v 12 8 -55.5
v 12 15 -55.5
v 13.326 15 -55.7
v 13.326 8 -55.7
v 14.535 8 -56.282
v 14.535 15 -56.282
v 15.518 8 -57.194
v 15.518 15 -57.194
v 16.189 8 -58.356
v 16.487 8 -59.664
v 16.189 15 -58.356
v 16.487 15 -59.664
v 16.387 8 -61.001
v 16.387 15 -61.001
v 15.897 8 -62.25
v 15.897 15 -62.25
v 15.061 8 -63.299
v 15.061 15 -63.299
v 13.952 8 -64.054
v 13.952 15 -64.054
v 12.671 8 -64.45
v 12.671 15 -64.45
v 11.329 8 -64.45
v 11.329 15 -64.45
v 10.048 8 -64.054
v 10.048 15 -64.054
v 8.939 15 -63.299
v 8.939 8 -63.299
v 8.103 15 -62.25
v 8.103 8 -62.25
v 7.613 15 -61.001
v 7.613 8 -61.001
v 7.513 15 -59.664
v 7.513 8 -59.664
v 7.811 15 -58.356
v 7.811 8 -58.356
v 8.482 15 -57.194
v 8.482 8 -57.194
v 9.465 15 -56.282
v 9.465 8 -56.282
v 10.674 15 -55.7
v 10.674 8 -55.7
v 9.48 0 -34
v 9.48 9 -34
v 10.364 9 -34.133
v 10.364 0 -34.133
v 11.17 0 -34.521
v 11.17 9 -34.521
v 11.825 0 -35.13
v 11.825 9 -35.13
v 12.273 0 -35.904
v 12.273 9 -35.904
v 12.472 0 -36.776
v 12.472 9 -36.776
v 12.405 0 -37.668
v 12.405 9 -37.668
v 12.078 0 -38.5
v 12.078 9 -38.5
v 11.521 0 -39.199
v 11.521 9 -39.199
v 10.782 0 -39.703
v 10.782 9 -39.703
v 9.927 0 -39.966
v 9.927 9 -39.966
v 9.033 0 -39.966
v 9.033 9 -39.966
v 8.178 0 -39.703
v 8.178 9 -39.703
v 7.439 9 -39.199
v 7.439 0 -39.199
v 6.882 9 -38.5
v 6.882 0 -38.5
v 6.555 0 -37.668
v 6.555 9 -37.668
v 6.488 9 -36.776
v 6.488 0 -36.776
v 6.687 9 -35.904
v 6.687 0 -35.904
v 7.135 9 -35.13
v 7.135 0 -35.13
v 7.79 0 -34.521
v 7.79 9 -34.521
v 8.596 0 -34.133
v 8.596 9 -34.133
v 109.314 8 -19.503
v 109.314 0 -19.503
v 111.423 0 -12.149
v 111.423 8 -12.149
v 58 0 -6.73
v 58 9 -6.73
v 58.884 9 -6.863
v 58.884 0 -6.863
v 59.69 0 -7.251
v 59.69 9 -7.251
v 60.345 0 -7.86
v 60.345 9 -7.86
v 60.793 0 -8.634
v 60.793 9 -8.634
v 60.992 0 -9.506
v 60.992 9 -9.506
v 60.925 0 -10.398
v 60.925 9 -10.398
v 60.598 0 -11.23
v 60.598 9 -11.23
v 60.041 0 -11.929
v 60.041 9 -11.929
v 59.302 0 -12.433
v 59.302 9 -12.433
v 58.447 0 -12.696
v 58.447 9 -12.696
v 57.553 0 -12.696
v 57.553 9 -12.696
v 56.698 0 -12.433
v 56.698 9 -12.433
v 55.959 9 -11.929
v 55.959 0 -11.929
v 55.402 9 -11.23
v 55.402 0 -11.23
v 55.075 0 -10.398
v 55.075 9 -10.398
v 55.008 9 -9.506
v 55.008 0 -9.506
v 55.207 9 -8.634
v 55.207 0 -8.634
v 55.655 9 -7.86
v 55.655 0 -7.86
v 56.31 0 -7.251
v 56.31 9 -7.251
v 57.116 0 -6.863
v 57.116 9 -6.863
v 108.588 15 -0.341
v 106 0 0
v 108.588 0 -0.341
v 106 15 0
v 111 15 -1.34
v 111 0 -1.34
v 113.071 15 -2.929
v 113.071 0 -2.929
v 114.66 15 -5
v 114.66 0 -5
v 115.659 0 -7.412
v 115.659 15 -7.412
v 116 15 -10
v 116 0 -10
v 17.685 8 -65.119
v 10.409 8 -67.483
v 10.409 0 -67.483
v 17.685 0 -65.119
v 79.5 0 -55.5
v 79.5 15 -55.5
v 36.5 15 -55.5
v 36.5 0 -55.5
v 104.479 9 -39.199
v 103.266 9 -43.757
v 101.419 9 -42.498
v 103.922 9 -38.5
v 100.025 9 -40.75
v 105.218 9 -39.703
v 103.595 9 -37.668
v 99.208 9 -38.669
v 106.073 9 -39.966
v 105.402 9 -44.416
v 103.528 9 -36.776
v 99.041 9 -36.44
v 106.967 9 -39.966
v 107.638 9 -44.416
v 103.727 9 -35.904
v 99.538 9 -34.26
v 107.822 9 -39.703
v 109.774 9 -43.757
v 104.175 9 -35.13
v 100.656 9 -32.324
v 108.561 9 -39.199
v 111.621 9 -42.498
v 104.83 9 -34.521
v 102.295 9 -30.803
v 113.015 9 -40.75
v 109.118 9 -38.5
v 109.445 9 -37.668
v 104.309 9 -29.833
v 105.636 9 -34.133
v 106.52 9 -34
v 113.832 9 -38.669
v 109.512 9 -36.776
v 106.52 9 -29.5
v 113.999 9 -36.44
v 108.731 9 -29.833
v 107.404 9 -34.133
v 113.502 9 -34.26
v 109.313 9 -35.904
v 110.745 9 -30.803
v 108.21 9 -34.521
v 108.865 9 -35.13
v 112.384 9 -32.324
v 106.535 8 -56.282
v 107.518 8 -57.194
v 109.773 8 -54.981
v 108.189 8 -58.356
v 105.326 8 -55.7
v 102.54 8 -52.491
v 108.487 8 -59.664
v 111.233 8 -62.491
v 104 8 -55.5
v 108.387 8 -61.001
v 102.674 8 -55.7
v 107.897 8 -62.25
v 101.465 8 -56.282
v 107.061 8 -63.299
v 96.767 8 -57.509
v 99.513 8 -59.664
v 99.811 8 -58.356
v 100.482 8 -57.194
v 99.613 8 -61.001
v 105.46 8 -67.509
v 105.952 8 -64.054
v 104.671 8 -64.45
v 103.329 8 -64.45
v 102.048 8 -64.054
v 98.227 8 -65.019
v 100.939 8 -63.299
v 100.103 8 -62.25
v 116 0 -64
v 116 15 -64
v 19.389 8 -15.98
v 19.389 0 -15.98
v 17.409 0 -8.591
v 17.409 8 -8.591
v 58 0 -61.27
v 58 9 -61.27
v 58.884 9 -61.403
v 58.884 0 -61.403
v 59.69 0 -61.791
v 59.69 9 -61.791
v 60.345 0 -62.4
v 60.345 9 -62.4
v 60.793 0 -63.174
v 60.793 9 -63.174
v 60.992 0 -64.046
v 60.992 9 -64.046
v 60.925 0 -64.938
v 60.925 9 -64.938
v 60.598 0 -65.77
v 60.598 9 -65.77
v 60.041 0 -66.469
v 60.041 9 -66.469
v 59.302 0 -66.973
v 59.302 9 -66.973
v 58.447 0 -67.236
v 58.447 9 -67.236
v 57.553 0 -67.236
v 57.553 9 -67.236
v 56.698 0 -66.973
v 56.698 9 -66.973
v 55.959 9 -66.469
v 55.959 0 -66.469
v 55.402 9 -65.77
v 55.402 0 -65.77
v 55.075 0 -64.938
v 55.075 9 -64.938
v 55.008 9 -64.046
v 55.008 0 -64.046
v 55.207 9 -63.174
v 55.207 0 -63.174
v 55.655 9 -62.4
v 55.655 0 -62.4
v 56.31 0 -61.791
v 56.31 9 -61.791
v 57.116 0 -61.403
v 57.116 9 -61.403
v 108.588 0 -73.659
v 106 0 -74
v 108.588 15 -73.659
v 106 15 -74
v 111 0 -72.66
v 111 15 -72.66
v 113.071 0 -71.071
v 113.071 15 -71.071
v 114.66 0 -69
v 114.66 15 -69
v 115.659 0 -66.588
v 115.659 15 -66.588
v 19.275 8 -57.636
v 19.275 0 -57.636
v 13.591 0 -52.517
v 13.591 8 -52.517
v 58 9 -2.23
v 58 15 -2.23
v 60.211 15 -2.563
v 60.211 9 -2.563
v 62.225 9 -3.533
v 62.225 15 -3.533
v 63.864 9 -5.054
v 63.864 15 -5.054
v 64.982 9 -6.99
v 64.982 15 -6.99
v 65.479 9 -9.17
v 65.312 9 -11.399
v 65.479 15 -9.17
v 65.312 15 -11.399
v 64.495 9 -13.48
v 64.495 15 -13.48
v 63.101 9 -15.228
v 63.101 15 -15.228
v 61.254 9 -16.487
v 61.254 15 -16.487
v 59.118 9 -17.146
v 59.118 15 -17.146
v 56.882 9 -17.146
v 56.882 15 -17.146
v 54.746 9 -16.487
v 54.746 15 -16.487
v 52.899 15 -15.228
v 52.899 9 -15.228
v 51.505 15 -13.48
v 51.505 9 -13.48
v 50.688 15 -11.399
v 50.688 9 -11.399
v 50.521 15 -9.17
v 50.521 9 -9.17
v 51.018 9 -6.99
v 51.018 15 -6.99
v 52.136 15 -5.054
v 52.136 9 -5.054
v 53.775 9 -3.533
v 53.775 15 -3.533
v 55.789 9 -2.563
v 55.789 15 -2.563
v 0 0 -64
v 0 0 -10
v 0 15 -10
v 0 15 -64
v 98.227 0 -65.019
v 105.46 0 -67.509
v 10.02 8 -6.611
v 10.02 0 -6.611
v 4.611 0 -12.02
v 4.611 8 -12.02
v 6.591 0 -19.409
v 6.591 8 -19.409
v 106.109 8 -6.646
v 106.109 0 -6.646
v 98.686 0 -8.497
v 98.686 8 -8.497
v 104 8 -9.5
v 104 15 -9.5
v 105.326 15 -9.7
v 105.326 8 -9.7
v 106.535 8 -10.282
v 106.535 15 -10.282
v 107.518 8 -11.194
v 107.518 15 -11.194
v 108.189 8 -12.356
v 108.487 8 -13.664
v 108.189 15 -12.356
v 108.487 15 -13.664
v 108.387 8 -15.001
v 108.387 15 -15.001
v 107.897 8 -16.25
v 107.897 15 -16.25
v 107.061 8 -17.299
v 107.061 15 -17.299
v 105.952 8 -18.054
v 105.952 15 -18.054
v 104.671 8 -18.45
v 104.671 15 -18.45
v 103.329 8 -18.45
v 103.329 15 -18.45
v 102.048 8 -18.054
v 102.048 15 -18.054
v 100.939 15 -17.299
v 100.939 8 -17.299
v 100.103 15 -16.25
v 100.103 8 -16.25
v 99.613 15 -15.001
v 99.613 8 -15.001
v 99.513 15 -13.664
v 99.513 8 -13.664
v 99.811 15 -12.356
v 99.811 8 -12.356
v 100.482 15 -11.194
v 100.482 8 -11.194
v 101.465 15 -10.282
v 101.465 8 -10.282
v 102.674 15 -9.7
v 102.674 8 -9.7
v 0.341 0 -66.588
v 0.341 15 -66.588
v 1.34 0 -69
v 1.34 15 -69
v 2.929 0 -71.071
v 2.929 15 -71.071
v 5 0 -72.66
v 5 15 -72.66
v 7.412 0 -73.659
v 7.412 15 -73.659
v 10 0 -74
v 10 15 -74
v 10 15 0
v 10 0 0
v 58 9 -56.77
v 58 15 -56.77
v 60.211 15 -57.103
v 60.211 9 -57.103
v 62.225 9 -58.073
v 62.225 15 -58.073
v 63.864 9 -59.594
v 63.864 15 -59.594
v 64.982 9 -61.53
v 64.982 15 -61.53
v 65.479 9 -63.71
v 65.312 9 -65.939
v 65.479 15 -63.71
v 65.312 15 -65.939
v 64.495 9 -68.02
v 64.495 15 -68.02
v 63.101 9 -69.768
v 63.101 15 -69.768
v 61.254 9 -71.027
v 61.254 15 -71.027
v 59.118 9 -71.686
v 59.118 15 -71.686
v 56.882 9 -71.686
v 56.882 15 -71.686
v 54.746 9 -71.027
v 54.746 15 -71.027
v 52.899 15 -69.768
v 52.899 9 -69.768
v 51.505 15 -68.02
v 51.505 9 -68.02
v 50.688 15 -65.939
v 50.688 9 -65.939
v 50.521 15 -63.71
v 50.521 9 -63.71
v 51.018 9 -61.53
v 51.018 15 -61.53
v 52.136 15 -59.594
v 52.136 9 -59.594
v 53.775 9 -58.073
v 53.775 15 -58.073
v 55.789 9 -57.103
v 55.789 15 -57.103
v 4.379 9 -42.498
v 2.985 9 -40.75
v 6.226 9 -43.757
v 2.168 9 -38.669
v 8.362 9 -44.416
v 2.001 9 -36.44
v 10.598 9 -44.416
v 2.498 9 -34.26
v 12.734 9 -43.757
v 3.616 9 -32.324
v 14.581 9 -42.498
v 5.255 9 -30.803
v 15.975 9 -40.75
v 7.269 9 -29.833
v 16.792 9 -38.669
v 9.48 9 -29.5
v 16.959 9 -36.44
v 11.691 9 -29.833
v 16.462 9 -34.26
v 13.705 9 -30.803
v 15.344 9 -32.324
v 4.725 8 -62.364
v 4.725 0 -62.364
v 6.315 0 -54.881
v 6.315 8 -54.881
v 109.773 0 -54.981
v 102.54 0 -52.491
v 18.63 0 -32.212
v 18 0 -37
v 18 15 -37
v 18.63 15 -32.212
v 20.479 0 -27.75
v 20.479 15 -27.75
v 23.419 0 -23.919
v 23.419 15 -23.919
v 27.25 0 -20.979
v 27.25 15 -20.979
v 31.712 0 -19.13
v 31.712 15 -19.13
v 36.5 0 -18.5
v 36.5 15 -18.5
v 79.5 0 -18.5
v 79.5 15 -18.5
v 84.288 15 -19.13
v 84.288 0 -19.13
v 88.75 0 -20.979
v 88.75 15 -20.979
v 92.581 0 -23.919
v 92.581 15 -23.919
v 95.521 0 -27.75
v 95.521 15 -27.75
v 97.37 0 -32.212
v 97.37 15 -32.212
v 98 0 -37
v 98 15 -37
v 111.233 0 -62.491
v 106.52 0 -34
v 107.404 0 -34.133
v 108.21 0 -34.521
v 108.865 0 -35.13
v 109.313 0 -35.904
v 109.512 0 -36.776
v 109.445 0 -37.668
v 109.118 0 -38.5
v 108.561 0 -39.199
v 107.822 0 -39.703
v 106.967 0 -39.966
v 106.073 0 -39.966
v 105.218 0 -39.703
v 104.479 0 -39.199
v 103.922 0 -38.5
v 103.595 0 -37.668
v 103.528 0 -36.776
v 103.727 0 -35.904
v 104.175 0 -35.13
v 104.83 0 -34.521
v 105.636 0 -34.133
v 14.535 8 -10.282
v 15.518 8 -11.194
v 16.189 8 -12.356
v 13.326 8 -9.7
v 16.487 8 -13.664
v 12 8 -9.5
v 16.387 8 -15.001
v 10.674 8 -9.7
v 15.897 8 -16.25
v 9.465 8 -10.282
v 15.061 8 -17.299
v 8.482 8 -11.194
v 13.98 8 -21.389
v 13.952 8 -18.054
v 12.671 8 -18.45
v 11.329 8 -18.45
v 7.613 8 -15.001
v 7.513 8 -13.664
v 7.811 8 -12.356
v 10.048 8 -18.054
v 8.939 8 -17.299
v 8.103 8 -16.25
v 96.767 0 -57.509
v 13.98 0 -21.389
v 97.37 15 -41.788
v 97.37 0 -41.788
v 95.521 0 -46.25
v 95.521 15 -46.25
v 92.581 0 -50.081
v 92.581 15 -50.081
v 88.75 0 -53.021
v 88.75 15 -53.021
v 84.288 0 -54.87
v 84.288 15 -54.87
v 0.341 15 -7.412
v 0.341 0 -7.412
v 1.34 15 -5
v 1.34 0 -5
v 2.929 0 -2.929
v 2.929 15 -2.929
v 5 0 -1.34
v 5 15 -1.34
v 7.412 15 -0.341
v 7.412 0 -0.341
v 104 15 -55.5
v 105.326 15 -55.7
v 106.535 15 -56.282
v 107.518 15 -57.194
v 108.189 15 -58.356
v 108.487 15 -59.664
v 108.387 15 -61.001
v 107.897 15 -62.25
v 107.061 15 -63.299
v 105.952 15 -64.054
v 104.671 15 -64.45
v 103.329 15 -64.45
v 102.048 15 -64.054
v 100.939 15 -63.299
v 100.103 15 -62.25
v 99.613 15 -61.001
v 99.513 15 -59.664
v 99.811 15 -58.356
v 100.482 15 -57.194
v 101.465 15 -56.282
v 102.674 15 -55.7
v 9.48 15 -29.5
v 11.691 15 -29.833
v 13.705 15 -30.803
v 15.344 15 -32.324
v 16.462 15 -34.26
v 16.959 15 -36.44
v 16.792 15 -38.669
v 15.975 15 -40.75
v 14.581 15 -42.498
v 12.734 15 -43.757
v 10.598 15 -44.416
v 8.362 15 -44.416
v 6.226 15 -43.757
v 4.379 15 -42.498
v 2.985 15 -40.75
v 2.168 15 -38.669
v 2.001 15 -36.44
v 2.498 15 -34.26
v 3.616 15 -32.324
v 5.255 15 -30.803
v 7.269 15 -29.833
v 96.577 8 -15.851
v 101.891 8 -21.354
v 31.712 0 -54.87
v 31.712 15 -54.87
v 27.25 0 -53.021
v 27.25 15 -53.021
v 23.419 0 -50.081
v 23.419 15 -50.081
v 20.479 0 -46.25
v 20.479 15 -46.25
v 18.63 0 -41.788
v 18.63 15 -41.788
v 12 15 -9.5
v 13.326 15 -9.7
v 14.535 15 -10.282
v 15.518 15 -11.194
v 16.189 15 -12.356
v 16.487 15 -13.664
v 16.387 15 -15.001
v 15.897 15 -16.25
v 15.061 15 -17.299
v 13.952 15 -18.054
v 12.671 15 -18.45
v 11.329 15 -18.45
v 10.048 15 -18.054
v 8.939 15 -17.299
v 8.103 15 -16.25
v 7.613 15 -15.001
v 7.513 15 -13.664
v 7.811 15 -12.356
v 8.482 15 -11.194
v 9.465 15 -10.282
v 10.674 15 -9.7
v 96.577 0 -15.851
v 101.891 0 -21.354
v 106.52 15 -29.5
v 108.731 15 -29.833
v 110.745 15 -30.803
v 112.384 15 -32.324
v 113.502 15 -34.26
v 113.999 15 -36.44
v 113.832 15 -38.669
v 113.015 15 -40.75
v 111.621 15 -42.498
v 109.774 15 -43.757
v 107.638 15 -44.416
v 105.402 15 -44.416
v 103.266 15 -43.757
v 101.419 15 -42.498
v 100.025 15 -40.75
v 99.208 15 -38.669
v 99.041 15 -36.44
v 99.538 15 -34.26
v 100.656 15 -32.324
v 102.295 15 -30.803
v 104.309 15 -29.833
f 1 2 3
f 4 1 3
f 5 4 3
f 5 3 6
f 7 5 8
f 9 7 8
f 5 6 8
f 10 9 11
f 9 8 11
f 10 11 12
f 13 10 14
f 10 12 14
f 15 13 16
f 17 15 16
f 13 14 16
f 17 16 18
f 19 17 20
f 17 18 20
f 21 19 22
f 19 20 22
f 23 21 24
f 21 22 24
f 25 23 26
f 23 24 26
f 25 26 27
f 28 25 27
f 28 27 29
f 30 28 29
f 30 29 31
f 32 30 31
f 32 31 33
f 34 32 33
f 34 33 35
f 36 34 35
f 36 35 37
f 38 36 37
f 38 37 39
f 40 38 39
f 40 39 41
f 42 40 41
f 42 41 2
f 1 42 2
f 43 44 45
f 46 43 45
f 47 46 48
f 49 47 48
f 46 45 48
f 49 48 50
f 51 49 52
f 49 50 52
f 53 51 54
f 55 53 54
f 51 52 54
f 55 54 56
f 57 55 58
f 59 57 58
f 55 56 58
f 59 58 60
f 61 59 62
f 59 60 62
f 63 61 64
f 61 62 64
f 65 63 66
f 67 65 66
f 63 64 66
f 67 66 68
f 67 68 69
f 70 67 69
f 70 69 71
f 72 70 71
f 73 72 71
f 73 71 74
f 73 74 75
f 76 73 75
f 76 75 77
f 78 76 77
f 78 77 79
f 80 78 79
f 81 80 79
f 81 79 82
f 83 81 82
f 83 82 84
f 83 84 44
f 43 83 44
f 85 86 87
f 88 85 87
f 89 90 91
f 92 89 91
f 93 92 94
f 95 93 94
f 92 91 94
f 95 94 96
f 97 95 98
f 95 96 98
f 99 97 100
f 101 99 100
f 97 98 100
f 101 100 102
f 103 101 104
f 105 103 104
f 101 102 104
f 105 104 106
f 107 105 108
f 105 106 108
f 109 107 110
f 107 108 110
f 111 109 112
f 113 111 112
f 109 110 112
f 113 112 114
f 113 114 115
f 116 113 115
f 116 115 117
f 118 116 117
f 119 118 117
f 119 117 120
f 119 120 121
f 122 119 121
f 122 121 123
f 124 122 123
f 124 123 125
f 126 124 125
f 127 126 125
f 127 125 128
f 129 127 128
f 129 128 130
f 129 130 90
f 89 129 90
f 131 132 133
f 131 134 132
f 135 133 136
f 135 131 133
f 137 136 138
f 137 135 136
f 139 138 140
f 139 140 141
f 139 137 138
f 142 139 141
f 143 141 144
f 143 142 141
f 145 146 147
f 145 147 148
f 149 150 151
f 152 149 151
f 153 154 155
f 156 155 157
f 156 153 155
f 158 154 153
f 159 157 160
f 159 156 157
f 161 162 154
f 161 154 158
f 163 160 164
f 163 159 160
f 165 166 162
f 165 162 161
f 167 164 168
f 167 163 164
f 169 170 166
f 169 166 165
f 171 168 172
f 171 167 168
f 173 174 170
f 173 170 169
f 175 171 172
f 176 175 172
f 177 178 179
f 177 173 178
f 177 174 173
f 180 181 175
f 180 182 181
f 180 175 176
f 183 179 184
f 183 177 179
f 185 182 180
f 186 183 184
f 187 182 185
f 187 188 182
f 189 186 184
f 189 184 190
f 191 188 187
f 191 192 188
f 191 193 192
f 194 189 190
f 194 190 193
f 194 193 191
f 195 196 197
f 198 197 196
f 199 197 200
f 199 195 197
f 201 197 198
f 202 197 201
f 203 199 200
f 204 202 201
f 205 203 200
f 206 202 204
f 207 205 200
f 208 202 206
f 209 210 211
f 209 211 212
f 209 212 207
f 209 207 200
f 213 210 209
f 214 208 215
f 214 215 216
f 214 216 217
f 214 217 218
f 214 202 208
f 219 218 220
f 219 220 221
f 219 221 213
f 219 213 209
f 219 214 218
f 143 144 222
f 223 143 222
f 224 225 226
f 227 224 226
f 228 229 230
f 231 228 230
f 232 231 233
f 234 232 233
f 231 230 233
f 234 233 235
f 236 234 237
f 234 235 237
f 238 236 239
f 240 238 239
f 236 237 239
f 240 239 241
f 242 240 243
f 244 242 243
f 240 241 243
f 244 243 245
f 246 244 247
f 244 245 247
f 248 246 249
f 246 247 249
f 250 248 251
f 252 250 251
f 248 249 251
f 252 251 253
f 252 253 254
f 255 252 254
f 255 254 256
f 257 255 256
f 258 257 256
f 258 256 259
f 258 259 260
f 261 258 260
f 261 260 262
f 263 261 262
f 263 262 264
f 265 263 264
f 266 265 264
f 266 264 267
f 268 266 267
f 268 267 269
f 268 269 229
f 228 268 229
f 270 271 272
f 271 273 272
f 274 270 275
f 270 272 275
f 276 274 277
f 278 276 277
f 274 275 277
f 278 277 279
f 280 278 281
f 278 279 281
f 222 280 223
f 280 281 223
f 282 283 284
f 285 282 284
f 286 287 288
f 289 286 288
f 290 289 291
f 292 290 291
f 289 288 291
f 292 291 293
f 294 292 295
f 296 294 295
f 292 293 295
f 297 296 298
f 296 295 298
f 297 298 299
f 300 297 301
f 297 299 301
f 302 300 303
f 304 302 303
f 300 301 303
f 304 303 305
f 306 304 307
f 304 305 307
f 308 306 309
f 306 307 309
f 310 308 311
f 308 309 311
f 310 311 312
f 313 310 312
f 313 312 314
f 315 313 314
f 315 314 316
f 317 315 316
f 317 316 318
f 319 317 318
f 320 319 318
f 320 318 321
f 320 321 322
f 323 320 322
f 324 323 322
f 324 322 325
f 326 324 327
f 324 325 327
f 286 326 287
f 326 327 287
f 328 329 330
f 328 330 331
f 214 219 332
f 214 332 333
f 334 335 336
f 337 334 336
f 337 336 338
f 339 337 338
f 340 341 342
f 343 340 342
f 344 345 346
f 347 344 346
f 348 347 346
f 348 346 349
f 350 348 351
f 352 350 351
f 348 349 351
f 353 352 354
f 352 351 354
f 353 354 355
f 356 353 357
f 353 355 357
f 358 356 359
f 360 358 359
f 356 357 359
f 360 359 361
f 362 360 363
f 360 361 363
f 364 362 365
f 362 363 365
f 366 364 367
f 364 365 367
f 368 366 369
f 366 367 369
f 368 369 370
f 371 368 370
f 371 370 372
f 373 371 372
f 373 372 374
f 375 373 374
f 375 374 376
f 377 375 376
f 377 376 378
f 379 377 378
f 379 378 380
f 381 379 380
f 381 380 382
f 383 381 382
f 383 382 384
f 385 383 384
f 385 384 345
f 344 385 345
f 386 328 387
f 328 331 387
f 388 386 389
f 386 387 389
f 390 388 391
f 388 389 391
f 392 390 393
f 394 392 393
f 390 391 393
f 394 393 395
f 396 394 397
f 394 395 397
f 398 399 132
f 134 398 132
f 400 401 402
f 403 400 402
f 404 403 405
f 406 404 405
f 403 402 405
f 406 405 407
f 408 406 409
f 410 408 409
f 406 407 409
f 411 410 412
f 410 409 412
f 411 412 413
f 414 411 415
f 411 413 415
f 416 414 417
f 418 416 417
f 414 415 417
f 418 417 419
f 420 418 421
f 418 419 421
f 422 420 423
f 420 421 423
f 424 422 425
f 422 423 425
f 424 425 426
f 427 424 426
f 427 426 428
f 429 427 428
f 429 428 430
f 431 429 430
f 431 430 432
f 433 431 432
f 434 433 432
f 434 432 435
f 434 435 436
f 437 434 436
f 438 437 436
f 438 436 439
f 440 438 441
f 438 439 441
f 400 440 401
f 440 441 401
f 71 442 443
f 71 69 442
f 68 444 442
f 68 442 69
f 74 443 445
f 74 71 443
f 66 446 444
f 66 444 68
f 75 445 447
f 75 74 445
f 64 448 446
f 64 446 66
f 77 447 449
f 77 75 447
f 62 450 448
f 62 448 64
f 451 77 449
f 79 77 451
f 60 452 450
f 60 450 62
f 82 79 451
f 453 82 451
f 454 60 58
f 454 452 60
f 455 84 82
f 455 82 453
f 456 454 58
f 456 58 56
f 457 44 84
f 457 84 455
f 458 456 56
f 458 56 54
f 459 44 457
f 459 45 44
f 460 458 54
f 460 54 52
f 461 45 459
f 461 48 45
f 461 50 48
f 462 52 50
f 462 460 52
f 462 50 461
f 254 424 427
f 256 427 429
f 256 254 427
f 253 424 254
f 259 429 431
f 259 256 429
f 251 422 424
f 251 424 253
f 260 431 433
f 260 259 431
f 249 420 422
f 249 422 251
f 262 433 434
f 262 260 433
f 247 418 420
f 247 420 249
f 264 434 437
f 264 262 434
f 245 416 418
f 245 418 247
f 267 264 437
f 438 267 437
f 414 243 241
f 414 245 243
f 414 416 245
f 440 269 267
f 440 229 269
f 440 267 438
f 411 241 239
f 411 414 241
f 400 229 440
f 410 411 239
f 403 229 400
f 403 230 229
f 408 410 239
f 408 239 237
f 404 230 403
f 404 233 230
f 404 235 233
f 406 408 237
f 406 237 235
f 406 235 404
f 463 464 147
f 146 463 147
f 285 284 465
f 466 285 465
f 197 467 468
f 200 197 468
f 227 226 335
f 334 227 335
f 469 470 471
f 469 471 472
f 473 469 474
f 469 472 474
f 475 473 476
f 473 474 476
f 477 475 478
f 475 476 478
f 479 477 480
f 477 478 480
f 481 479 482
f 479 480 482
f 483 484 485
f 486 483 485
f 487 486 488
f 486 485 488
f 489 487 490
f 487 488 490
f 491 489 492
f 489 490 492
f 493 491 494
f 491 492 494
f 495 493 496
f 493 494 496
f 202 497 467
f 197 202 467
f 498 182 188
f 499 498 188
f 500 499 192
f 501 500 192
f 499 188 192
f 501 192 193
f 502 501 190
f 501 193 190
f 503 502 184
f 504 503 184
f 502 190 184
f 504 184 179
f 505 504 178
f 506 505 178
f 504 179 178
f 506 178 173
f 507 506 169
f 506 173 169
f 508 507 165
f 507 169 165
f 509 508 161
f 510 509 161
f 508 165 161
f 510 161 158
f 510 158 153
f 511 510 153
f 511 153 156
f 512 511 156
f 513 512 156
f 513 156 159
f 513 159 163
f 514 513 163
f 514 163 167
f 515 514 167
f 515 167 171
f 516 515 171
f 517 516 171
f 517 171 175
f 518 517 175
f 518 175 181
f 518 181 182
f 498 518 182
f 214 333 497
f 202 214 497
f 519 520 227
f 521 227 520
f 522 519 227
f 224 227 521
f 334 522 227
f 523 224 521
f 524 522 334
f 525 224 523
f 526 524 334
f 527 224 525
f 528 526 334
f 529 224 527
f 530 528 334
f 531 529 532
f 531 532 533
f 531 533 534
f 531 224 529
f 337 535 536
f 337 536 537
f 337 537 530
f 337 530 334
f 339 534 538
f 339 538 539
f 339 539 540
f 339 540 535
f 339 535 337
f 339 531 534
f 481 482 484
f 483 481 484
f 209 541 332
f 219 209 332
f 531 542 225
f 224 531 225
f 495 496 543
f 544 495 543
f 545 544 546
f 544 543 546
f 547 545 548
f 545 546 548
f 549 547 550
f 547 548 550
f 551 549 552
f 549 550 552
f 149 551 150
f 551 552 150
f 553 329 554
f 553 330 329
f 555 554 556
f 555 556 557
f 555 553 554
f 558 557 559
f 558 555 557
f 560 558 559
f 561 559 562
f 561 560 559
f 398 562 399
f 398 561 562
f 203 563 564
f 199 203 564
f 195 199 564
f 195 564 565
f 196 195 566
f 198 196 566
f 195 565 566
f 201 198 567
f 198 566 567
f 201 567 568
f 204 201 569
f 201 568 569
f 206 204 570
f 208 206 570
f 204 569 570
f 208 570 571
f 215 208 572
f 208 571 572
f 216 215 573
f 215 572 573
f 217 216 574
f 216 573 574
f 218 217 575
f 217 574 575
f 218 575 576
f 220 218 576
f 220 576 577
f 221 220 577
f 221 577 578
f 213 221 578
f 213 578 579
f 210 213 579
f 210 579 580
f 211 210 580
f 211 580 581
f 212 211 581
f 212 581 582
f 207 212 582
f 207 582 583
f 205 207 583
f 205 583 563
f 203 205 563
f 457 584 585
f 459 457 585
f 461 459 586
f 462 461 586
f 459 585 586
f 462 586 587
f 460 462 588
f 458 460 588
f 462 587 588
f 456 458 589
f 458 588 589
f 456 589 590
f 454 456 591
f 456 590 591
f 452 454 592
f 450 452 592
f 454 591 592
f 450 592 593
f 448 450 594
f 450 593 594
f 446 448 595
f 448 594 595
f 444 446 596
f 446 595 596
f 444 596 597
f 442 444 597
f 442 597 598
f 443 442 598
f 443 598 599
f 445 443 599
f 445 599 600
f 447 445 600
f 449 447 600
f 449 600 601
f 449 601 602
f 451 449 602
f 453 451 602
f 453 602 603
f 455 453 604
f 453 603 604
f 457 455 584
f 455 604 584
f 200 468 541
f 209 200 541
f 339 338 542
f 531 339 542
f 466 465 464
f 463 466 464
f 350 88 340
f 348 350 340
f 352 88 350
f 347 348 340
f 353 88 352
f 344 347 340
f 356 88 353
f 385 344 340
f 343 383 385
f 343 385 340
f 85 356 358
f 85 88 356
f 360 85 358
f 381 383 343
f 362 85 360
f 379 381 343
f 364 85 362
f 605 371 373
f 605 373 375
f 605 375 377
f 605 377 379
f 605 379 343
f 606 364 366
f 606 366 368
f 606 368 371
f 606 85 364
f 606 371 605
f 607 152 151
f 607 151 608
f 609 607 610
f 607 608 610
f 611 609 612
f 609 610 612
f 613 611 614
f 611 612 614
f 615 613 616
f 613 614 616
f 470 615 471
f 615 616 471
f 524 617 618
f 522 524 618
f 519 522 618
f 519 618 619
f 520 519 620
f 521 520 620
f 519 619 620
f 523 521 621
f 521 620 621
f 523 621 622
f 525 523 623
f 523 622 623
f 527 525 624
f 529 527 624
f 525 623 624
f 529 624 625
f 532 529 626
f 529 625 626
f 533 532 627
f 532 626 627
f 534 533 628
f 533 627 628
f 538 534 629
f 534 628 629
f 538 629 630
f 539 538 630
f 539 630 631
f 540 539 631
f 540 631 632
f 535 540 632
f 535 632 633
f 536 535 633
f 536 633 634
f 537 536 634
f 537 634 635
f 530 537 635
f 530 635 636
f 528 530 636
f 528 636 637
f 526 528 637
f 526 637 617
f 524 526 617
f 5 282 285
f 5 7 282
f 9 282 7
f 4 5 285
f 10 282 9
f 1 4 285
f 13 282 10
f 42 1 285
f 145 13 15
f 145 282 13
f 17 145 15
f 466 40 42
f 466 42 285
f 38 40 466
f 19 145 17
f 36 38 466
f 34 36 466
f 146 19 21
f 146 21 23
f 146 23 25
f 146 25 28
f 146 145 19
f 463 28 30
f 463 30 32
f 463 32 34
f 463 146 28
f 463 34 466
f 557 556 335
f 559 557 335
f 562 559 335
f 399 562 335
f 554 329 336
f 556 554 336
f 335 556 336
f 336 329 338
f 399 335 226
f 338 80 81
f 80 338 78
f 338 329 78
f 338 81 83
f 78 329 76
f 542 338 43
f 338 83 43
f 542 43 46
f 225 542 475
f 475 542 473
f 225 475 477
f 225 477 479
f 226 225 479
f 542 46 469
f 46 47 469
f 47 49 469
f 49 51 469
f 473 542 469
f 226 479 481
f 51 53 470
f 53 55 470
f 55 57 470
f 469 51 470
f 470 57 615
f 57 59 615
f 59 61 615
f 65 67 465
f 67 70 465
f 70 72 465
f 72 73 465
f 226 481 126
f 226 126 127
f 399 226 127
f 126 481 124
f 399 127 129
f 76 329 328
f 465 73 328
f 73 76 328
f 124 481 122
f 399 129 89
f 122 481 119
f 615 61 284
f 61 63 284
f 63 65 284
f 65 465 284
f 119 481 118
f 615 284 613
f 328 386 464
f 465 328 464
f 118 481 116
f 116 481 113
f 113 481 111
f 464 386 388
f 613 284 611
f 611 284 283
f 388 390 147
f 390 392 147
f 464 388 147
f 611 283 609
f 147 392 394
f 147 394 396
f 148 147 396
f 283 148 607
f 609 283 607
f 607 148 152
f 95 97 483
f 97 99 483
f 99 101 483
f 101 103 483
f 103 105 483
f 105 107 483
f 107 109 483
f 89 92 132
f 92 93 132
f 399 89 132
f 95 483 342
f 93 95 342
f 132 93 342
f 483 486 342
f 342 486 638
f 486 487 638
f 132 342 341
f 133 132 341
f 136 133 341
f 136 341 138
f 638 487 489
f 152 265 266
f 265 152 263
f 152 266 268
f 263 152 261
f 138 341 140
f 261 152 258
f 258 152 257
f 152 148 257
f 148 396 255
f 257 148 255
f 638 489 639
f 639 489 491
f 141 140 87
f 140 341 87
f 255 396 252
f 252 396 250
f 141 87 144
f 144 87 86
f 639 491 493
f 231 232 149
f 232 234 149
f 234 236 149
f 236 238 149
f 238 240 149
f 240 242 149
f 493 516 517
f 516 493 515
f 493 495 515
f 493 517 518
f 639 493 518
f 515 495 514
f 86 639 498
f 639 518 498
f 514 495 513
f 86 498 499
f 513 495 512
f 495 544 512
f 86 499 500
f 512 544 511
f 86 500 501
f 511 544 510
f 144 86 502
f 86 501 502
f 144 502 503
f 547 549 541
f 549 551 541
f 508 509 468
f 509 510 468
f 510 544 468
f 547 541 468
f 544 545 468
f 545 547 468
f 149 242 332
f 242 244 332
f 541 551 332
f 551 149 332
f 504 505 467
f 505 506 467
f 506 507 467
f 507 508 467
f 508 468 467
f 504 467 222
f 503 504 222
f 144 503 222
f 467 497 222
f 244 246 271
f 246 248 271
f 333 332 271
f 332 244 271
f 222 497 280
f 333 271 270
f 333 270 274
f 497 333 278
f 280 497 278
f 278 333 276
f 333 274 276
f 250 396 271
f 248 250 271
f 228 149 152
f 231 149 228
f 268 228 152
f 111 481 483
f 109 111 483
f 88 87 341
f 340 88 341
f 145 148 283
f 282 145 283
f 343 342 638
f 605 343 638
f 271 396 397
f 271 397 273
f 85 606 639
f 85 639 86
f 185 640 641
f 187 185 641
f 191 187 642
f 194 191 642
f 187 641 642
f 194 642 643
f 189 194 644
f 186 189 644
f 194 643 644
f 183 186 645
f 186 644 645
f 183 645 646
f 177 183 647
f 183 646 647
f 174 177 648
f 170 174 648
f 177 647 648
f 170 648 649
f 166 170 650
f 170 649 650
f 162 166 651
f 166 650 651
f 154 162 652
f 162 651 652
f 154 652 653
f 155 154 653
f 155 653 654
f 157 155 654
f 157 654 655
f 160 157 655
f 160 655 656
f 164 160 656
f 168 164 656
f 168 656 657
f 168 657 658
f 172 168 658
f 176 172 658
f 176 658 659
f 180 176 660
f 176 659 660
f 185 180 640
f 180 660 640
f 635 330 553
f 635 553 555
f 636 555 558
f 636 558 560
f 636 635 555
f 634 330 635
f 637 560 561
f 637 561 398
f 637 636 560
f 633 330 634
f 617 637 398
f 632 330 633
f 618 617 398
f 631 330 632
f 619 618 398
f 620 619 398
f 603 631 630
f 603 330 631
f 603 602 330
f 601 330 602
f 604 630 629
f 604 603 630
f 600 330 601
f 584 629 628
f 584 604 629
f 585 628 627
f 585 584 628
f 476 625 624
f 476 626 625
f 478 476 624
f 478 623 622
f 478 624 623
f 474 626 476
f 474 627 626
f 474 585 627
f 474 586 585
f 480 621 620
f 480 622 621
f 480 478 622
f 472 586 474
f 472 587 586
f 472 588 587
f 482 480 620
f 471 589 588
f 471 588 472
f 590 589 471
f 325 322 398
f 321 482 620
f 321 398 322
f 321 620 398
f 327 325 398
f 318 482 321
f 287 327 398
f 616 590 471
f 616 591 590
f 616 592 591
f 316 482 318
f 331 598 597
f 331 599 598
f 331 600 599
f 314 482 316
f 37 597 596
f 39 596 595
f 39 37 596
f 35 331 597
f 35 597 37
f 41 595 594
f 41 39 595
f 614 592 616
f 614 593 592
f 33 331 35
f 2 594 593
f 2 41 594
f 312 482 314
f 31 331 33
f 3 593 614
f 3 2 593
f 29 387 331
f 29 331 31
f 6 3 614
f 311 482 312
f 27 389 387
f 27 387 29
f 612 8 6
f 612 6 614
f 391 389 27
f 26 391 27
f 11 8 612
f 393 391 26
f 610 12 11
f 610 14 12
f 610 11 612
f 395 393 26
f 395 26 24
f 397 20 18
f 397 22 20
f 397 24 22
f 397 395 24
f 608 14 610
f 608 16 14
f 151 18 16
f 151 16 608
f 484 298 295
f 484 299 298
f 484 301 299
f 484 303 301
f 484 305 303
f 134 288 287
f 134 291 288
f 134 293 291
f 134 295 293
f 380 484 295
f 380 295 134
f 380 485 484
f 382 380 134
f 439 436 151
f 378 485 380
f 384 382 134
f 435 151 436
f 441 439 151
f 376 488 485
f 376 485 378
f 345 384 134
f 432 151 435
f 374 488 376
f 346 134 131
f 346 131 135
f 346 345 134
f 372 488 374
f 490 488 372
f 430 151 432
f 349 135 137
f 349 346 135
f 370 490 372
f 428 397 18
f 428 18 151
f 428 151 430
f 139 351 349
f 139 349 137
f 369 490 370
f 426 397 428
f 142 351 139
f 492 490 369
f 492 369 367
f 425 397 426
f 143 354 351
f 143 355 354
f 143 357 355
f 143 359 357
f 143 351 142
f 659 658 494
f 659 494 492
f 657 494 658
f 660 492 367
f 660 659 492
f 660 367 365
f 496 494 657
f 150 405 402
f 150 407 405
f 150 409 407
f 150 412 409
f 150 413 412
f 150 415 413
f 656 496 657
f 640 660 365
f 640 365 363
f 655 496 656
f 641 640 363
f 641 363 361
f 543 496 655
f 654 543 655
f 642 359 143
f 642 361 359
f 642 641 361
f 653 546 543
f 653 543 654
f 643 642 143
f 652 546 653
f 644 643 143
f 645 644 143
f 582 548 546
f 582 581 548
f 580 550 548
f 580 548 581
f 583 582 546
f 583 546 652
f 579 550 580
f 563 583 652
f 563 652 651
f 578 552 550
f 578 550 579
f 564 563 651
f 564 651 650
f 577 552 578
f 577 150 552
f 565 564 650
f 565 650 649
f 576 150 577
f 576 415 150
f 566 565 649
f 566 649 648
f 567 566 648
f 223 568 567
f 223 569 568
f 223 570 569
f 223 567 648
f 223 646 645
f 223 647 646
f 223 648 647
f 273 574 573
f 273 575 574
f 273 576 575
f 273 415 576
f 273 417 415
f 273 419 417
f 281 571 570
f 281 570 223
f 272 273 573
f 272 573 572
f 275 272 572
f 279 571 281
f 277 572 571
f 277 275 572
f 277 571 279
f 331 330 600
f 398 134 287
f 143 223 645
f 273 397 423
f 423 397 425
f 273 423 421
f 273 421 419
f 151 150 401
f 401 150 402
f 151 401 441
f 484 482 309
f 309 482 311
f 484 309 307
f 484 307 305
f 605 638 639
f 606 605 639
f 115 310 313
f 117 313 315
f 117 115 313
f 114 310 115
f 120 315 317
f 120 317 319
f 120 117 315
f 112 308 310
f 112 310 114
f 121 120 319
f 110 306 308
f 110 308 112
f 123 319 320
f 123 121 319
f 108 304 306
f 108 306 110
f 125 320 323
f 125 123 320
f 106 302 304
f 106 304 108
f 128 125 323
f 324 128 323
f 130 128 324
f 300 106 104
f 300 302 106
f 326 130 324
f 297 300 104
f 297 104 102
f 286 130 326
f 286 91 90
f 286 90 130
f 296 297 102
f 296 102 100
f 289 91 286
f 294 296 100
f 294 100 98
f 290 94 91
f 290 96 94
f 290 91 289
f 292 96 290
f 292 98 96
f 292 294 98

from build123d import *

# Parameters (mm, degrees)
SKETCH1_W           = 116
SKETCH1_H           = 74
BOSS_EXTRUDE1_DEPTH = 15
CUT_EXTRUDE1_DEPTH  = 15
SKETCH4_R           = 4.5
CUT_EXTRUDE2_DEPTH  = 15
SKETCH5_R           = 3
CUT_EXTRUDE3_DEPTH  = 15
SKETCH6_R           = 7.5
CUT_EXTRUDE4_DEPTH  = 6
CUT_EXTRUDE5_DEPTH  = 8
FILLET1_R           = 10
FILLET2_R           = 10


with BuildPart() as part:
    # Sketch1 → Boss-Extrude1 (new body)
    with BuildSketch(Plane(origin=(0, 0, 0), x_dir=(1, 0, 0), z_dir=(0, 1, 0))):
        with Locations((58, 37)):
            Rectangle(SKETCH1_W, SKETCH1_H)
    extrude(amount=BOSS_EXTRUDE1_DEPTH)

    # Sketch2 → Cut-Extrude1 (cut)
    with BuildSketch(Plane(origin=(0, 15, 0), x_dir=(1, 0, 0), z_dir=(0, 1, 0))):
        with BuildLine():
            Line((79.5, 55.5), (36.5, 55.5))
            ThreePointArc((36.5, 55.5), (23.418524548, 50.081475452), (18, 37))
            ThreePointArc((18, 37), (23.418524548, 23.918524548), (36.5, 18.5))
            Line((36.5, 18.5), (79.5, 18.5))
            ThreePointArc((79.5, 18.5), (92.581475452, 23.918524548), (98, 37))
            ThreePointArc((98, 37), (92.581475452, 50.081475452), (79.5, 55.5))
        make_face()
    extrude(amount=-CUT_EXTRUDE1_DEPTH, mode=Mode.SUBTRACT)

    # Sketch4 → Cut-Extrude2 (cut)
    with BuildSketch(Plane(origin=(0, 15, 0), x_dir=(1, 0, 0), z_dir=(0, 1, 0))):
        with Locations(Location((12, 60, 0), (0, 0, 270))):  # turned: the seam where the file's is
            Circle(SKETCH4_R)
        with Locations(Location((12, 14, 0), (0, 0, 270))):  # turned: the seam where the file's is
            Circle(SKETCH4_R)
        with Locations(Location((104, 60, 0), (0, 0, 270))):  # turned: the seam where the file's is
            Circle(SKETCH4_R)
        with Locations(Location((104, 14, 0), (0, 0, 270))):  # turned: the seam where the file's is
            Circle(SKETCH4_R)
    extrude(amount=-CUT_EXTRUDE2_DEPTH, mode=Mode.SUBTRACT)

    # Sketch5 → Cut-Extrude3 (cut)
    with BuildSketch(Plane(origin=(0, 15, 0), x_dir=(1, 0, 0), z_dir=(0, 1, 0))):
        with Locations(Location((9.48, 37, 0), (0, 0, 270))):  # turned: the seam where the file's is
            Circle(SKETCH5_R)
        with Locations(Location((58, 64.27, 0), (0, 0, 270))):  # turned: the seam where the file's is
            Circle(SKETCH5_R)
        with Locations(Location((106.52, 37, 0), (0, 0, 270))):  # turned: the seam where the file's is
            Circle(SKETCH5_R)
        with Locations(Location((58, 9.73, 0), (0, 0, 270))):  # turned: the seam where the file's is
            Circle(SKETCH5_R)
    extrude(amount=-CUT_EXTRUDE3_DEPTH, mode=Mode.SUBTRACT)

    # Sketch6 → Cut-Extrude4 (cut)
    with BuildSketch(Plane(origin=(0, 15, 0), x_dir=(1, 0, 0), z_dir=(0, 1, 0))):
        with Locations(Location((58, 64.27, 0), (0, 0, 270))):  # turned: the seam where the file's is
            Circle(SKETCH6_R)
        with Locations(Location((9.48, 37, 0), (0, 0, 270))):  # turned: the seam where the file's is
            Circle(SKETCH6_R)
        with Locations(Location((106.52, 37, 0), (0, 0, 270))):  # turned: the seam where the file's is
            Circle(SKETCH6_R)
        with Locations(Location((58, 9.73, 0), (0, 0, 270))):  # turned: the seam where the file's is
            Circle(SKETCH6_R)
    extrude(amount=-CUT_EXTRUDE4_DEPTH, mode=Mode.SUBTRACT)

    # Sketch8 → Cut-Extrude5 (cut)
    with BuildSketch(Plane(origin=(0, 0, 0), x_dir=(-1, 0, 0), z_dir=(0, -1, 0))):
        Polygon((-13.979937501, 21.38922735), (-19.38922735, 15.979937501), (-17.409289849, 8.590710151), (-10.020062499, 6.61077265), (-4.61077265, 12.020062499), (-6.590710151, 19.409289849), align=None)
        Polygon((-96.577343391, 15.850676148), (-101.891404254, 21.353547261), (-109.314060863, 19.502871113), (-111.422656609, 12.149323852), (-106.108595746, 6.646452739), (-98.685939137, 8.497128887), align=None)
        Polygon((-102.540331971, 52.490658978), (-96.766885895, 57.509439084), (-98.226553924, 65.018780105), (-105.459668029, 67.509341022), (-111.233114105, 62.490560916), (-109.773446076, 54.981219895), align=None)
        Polygon((-19.275478748, 57.636053655), (-13.590501786, 52.517277407), (-6.315023038, 54.881223752), (-4.724521252, 62.363946345), (-10.409498214, 67.482722593), (-17.684976962, 65.118776248), align=None)
    extrude(amount=-CUT_EXTRUDE5_DEPTH, mode=Mode.SUBTRACT)

    # Fillet1
    fillet1_edges = [part.edges().sort_by_distance(p)[0] for p in [
        (0, 7.5, 0),
        (116, 7.5, 0),
        (116, 7.5, -74),
    ]]
    fillet(fillet1_edges, radius=FILLET1_R)

    # Fillet2
    fillet2_edges = [part.edges().sort_by_distance(p)[0] for p in [
        (0, 7.5, -74),
    ]]
    fillet(fillet2_edges, radius=FILLET2_R)


solid = part.part
